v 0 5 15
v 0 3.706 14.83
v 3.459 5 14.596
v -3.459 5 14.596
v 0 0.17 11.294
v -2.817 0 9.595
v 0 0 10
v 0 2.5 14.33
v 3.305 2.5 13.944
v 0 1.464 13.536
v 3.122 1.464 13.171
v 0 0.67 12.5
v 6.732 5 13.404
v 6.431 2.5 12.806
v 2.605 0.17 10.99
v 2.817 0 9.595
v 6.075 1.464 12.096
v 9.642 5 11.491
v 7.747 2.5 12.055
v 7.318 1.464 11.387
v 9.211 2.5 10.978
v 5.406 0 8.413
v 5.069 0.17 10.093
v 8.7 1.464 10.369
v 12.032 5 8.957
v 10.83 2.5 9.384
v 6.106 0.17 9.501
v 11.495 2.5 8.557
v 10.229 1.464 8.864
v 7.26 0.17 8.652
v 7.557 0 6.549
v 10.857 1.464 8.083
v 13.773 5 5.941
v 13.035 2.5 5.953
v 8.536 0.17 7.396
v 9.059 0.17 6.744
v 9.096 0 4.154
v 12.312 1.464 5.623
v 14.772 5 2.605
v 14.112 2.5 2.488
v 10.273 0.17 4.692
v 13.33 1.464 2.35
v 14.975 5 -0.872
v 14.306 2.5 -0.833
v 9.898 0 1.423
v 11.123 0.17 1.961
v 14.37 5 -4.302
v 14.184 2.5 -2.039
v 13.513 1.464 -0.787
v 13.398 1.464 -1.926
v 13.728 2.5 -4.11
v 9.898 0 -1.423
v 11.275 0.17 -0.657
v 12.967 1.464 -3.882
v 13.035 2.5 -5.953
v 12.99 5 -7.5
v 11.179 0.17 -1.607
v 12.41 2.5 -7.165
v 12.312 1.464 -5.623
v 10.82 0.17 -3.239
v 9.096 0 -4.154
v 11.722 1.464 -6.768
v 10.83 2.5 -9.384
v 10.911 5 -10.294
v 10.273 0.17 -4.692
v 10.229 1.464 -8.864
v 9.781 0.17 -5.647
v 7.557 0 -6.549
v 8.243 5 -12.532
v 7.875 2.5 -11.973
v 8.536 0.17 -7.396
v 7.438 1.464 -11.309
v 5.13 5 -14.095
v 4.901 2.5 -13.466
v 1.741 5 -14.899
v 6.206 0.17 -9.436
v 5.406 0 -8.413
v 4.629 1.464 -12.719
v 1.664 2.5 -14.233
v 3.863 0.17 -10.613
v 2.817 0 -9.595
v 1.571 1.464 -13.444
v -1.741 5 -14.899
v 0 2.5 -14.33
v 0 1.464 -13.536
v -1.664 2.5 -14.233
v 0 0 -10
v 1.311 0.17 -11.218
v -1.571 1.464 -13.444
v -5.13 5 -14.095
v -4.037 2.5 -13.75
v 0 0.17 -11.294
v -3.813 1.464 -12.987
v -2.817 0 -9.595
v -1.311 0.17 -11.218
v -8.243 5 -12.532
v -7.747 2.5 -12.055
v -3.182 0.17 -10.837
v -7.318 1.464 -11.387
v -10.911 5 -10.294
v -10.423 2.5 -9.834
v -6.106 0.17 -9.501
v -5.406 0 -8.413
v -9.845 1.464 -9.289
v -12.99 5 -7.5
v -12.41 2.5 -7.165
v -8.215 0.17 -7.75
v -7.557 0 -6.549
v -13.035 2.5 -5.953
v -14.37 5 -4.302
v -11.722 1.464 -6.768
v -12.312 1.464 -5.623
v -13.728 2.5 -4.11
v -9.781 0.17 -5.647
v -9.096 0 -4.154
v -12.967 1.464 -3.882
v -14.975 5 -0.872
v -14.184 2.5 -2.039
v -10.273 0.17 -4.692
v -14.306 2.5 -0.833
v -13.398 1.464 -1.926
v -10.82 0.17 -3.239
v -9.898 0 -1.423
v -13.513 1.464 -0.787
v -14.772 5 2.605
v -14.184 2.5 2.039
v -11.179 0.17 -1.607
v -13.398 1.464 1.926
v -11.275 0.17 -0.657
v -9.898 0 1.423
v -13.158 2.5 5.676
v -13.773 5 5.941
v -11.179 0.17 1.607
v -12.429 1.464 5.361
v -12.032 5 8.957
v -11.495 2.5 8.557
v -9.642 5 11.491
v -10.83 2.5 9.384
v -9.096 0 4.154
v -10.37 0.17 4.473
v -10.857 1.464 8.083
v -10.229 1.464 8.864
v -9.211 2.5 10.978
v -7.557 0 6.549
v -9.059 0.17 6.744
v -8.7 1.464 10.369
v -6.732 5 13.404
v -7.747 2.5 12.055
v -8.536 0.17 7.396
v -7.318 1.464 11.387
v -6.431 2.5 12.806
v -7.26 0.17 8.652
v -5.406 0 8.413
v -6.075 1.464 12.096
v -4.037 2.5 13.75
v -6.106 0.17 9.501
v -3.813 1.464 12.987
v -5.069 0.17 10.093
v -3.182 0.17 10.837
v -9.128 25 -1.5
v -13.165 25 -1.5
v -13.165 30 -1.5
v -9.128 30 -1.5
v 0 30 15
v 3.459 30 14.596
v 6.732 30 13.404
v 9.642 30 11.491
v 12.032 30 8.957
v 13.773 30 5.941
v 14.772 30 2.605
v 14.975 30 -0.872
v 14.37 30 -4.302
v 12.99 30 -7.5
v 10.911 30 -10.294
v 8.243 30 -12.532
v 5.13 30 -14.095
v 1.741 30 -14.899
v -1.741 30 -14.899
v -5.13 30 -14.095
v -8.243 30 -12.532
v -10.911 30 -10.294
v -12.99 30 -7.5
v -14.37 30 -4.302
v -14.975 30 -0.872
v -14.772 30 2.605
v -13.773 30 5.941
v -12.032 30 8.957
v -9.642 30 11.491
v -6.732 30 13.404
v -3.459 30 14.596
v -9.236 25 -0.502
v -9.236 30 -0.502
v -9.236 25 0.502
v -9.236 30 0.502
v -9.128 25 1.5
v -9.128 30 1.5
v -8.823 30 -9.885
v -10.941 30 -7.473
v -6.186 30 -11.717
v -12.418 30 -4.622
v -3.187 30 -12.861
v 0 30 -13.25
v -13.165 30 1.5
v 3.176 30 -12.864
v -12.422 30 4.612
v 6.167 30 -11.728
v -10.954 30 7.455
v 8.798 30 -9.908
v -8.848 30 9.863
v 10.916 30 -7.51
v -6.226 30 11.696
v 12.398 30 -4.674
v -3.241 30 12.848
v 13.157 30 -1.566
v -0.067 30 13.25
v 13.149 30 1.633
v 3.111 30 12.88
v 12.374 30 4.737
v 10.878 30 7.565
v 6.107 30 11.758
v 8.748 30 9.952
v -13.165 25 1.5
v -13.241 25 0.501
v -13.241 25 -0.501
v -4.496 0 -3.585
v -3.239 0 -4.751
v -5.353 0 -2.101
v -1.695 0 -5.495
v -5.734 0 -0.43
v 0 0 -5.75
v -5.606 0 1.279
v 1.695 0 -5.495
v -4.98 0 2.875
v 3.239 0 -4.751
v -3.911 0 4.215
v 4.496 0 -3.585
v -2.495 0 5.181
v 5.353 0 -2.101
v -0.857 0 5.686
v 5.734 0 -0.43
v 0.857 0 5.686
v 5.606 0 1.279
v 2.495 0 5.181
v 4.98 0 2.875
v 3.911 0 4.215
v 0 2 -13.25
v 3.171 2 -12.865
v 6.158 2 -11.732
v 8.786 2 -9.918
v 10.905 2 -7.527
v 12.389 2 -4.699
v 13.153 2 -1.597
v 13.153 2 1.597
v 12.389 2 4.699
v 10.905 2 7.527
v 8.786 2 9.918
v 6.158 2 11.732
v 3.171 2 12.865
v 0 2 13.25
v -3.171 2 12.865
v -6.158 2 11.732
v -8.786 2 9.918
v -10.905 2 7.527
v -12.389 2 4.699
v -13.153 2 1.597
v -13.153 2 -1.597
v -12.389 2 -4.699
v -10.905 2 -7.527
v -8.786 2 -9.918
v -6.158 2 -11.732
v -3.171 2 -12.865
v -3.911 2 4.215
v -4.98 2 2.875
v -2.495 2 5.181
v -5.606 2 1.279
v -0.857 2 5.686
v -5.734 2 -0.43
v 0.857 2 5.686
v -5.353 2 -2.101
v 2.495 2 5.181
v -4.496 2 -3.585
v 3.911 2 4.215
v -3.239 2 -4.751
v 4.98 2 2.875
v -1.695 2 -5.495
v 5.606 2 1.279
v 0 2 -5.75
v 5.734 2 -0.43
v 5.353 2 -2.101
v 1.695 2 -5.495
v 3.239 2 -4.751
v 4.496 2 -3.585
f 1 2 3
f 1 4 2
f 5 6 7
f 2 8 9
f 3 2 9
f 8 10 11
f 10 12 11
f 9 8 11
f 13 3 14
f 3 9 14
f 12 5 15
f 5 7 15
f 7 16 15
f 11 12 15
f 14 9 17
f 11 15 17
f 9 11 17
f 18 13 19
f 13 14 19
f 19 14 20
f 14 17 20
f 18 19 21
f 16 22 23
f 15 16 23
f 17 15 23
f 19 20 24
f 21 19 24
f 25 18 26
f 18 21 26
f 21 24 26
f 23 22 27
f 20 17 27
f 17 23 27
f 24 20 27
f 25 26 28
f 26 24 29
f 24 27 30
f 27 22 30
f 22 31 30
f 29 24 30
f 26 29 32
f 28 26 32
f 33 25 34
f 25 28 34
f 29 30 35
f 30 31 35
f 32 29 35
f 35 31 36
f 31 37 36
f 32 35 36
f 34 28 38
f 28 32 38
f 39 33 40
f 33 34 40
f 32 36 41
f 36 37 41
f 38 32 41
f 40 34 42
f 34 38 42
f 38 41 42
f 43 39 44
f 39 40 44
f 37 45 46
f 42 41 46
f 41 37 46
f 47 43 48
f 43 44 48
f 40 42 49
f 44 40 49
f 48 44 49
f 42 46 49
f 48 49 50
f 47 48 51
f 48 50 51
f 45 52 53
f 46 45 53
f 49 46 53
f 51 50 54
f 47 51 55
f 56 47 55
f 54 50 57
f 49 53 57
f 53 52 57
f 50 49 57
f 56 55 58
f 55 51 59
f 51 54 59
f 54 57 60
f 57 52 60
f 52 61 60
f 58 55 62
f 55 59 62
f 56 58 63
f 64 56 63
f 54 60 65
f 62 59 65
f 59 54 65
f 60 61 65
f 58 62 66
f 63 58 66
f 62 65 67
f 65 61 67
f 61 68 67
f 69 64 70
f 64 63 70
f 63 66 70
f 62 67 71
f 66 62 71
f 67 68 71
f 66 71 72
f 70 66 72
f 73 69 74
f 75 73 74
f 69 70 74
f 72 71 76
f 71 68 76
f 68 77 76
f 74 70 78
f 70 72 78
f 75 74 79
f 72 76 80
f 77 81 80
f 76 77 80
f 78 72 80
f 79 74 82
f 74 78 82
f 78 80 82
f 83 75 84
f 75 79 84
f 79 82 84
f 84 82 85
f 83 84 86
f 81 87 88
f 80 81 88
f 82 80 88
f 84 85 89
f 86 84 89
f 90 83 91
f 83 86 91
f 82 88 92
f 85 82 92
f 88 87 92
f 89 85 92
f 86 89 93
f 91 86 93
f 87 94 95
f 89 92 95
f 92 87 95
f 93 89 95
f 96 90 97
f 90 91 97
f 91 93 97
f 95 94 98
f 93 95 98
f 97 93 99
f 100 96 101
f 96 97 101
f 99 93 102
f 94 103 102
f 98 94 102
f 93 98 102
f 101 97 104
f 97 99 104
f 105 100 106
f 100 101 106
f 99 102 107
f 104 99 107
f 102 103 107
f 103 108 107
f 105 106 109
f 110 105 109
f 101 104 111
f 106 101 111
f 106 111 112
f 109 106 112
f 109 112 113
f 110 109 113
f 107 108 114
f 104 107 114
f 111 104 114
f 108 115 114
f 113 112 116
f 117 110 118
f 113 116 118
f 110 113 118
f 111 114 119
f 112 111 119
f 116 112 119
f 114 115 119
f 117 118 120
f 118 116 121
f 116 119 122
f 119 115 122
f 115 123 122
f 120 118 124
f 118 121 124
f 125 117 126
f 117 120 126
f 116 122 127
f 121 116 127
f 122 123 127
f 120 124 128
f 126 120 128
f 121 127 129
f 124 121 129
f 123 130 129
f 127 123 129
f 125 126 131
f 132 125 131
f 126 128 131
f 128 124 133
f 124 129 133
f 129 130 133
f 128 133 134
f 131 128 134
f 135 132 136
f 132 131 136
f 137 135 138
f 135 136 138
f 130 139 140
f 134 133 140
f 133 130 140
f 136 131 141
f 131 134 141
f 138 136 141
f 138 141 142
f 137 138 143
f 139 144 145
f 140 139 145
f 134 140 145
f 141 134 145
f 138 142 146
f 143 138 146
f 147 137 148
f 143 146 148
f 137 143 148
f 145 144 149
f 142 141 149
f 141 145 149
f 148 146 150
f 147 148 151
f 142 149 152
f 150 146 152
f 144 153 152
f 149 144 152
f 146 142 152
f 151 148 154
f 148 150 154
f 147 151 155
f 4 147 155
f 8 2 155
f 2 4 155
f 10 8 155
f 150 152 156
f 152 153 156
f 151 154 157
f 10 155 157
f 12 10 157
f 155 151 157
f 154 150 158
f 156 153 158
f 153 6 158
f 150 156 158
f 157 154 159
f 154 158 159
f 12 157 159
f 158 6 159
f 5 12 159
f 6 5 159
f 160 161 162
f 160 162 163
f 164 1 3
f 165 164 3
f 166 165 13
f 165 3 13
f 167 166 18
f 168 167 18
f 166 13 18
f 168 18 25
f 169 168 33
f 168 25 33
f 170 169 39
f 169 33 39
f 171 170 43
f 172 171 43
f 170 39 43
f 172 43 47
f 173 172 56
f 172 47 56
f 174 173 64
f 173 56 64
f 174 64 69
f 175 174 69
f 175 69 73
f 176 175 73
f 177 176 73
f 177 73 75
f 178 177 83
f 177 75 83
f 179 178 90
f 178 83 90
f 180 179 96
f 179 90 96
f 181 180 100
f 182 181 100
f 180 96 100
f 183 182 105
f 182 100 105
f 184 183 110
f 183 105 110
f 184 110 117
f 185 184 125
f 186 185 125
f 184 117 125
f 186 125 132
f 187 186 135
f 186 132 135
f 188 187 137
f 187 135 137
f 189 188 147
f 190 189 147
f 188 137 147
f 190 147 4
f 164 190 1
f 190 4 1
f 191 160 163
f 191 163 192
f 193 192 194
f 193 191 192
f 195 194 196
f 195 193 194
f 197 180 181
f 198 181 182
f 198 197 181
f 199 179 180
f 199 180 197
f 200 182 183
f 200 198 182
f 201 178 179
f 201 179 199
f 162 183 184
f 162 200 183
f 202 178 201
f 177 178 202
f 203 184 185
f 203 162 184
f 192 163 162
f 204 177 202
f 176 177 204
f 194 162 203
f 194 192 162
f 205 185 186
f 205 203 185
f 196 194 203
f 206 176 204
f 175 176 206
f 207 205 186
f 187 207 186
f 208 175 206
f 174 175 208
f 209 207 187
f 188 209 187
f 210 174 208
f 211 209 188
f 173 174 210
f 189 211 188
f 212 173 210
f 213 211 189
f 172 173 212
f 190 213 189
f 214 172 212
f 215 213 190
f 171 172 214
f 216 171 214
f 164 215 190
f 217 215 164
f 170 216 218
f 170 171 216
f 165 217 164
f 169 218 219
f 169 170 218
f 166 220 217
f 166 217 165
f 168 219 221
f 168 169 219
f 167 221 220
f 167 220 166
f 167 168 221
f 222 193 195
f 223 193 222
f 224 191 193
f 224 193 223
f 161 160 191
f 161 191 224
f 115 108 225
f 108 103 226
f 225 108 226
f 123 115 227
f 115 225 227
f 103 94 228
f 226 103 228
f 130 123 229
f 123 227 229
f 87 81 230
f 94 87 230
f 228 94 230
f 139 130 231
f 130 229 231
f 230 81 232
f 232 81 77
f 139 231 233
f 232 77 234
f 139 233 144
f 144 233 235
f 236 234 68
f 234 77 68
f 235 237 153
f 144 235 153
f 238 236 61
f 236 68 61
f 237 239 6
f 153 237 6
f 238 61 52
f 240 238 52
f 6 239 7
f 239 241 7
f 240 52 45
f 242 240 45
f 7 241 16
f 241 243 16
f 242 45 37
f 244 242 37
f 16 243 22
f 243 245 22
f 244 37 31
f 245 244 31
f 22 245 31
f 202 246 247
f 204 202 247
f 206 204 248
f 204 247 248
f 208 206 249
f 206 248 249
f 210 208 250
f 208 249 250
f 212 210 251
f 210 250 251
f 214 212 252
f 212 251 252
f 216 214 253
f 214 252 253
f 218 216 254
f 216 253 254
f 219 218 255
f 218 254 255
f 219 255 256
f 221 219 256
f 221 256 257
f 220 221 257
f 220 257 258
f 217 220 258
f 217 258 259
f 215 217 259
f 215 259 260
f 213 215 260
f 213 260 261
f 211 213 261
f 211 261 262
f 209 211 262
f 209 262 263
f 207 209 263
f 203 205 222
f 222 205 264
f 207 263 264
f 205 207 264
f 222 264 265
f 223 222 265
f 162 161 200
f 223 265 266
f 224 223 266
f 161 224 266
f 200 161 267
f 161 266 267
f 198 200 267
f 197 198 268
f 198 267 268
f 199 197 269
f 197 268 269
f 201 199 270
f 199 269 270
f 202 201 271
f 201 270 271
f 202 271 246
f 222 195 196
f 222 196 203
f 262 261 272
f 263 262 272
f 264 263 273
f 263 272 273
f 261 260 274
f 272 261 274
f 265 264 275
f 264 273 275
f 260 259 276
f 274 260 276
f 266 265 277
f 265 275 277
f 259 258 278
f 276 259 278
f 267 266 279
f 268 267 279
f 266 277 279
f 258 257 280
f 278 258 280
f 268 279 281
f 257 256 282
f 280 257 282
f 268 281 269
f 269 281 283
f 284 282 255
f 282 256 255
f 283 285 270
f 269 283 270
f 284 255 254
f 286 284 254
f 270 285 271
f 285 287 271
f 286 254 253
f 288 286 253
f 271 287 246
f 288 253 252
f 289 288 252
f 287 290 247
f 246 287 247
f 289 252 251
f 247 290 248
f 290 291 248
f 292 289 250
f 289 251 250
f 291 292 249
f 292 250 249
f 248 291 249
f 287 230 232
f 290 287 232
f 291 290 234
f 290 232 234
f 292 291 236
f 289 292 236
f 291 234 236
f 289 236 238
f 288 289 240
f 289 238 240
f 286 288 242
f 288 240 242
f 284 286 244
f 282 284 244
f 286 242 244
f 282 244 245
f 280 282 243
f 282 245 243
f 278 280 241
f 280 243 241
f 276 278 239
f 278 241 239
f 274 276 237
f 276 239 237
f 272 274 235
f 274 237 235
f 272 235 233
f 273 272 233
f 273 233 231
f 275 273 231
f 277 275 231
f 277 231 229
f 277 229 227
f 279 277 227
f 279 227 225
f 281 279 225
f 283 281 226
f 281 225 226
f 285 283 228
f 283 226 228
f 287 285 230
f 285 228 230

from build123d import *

# Parameters (mm, degrees)
SCHIZZO1_R                   = 15
ESTRUSIONE_ESTRUSIONE1_DEPTH = 30
SCHIZZO3_R                   = 5.75
TAGLIO_ESTRUSIONE1_DEPTH     = 2
SCHIZZO4_R                   = 13.25
TAGLIO_ESTRUSIONE2_DEPTH     = 36.128336141
ESTRUSIONE_ESTRUSIONE2_START = -5
ESTRUSIONE_ESTRUSIONE2_DEPTH = 5
RACCORDO1_R                  = 5


with BuildPart() as part:
    # Schizzo1 → Estrusione-Estrusione1 (new body)
    with BuildSketch(Plane(origin=(0, 0, 0), x_dir=(1, 0, 0), z_dir=(0, 1, 0))):
        with Locations(Location((0, 0, 0), (0, 0, 270))):
            Circle(SCHIZZO1_R)
    extrude(amount=ESTRUSIONE_ESTRUSIONE1_DEPTH)

    # Schizzo3 → Taglio-Estrusione1 (cut)
    with BuildSketch(Plane.XZ):
        with Locations(Location((0, 0, 0), (0, 0, 270))):
            Circle(SCHIZZO3_R)
    extrude(amount=-TAGLIO_ESTRUSIONE1_DEPTH, mode=Mode.SUBTRACT)

    # Schizzo4 → Taglio-Estrusione2 (cut, through all)
    with BuildSketch(Plane.XZ.offset(-2)):
        with Locations(Location((0, 0, 0), (0, 0, 270))):
            Circle(SCHIZZO4_R)
    extrude(amount=-TAGLIO_ESTRUSIONE2_DEPTH, mode=Mode.SUBTRACT)

    # Schizzo5 → Estrusione-Estrusione2 (add)
    with BuildSketch(Plane(origin=(0, 30, 0), x_dir=(1, 0, 0), z_dir=(0, 1, 0)).offset(ESTRUSIONE_ESTRUSIONE2_START)):
        with BuildLine():
            Line((-13.164820546, 1.5), (-9.127568132, 1.5))
            ThreePointArc((-9.127568132, 1.5), (-9.25, 0), (-9.127568132, -1.5))
            Line((-9.127568132, -1.5), (-13.164820546, -1.5))
            ThreePointArc((-13.164820546, -1.5), (-13.25, 0), (-13.164820546, 1.5))
        make_face()
    extrude(amount=ESTRUSIONE_ESTRUSIONE2_DEPTH)

    # Raccordo1
    raccordo1_edges = [part.edges().sort_by_distance(p)[0] for p in [
        (0, 0, -15),
    ]]
    fillet(raccordo1_edges, radius=RACCORDO1_R)


solid = part.part
